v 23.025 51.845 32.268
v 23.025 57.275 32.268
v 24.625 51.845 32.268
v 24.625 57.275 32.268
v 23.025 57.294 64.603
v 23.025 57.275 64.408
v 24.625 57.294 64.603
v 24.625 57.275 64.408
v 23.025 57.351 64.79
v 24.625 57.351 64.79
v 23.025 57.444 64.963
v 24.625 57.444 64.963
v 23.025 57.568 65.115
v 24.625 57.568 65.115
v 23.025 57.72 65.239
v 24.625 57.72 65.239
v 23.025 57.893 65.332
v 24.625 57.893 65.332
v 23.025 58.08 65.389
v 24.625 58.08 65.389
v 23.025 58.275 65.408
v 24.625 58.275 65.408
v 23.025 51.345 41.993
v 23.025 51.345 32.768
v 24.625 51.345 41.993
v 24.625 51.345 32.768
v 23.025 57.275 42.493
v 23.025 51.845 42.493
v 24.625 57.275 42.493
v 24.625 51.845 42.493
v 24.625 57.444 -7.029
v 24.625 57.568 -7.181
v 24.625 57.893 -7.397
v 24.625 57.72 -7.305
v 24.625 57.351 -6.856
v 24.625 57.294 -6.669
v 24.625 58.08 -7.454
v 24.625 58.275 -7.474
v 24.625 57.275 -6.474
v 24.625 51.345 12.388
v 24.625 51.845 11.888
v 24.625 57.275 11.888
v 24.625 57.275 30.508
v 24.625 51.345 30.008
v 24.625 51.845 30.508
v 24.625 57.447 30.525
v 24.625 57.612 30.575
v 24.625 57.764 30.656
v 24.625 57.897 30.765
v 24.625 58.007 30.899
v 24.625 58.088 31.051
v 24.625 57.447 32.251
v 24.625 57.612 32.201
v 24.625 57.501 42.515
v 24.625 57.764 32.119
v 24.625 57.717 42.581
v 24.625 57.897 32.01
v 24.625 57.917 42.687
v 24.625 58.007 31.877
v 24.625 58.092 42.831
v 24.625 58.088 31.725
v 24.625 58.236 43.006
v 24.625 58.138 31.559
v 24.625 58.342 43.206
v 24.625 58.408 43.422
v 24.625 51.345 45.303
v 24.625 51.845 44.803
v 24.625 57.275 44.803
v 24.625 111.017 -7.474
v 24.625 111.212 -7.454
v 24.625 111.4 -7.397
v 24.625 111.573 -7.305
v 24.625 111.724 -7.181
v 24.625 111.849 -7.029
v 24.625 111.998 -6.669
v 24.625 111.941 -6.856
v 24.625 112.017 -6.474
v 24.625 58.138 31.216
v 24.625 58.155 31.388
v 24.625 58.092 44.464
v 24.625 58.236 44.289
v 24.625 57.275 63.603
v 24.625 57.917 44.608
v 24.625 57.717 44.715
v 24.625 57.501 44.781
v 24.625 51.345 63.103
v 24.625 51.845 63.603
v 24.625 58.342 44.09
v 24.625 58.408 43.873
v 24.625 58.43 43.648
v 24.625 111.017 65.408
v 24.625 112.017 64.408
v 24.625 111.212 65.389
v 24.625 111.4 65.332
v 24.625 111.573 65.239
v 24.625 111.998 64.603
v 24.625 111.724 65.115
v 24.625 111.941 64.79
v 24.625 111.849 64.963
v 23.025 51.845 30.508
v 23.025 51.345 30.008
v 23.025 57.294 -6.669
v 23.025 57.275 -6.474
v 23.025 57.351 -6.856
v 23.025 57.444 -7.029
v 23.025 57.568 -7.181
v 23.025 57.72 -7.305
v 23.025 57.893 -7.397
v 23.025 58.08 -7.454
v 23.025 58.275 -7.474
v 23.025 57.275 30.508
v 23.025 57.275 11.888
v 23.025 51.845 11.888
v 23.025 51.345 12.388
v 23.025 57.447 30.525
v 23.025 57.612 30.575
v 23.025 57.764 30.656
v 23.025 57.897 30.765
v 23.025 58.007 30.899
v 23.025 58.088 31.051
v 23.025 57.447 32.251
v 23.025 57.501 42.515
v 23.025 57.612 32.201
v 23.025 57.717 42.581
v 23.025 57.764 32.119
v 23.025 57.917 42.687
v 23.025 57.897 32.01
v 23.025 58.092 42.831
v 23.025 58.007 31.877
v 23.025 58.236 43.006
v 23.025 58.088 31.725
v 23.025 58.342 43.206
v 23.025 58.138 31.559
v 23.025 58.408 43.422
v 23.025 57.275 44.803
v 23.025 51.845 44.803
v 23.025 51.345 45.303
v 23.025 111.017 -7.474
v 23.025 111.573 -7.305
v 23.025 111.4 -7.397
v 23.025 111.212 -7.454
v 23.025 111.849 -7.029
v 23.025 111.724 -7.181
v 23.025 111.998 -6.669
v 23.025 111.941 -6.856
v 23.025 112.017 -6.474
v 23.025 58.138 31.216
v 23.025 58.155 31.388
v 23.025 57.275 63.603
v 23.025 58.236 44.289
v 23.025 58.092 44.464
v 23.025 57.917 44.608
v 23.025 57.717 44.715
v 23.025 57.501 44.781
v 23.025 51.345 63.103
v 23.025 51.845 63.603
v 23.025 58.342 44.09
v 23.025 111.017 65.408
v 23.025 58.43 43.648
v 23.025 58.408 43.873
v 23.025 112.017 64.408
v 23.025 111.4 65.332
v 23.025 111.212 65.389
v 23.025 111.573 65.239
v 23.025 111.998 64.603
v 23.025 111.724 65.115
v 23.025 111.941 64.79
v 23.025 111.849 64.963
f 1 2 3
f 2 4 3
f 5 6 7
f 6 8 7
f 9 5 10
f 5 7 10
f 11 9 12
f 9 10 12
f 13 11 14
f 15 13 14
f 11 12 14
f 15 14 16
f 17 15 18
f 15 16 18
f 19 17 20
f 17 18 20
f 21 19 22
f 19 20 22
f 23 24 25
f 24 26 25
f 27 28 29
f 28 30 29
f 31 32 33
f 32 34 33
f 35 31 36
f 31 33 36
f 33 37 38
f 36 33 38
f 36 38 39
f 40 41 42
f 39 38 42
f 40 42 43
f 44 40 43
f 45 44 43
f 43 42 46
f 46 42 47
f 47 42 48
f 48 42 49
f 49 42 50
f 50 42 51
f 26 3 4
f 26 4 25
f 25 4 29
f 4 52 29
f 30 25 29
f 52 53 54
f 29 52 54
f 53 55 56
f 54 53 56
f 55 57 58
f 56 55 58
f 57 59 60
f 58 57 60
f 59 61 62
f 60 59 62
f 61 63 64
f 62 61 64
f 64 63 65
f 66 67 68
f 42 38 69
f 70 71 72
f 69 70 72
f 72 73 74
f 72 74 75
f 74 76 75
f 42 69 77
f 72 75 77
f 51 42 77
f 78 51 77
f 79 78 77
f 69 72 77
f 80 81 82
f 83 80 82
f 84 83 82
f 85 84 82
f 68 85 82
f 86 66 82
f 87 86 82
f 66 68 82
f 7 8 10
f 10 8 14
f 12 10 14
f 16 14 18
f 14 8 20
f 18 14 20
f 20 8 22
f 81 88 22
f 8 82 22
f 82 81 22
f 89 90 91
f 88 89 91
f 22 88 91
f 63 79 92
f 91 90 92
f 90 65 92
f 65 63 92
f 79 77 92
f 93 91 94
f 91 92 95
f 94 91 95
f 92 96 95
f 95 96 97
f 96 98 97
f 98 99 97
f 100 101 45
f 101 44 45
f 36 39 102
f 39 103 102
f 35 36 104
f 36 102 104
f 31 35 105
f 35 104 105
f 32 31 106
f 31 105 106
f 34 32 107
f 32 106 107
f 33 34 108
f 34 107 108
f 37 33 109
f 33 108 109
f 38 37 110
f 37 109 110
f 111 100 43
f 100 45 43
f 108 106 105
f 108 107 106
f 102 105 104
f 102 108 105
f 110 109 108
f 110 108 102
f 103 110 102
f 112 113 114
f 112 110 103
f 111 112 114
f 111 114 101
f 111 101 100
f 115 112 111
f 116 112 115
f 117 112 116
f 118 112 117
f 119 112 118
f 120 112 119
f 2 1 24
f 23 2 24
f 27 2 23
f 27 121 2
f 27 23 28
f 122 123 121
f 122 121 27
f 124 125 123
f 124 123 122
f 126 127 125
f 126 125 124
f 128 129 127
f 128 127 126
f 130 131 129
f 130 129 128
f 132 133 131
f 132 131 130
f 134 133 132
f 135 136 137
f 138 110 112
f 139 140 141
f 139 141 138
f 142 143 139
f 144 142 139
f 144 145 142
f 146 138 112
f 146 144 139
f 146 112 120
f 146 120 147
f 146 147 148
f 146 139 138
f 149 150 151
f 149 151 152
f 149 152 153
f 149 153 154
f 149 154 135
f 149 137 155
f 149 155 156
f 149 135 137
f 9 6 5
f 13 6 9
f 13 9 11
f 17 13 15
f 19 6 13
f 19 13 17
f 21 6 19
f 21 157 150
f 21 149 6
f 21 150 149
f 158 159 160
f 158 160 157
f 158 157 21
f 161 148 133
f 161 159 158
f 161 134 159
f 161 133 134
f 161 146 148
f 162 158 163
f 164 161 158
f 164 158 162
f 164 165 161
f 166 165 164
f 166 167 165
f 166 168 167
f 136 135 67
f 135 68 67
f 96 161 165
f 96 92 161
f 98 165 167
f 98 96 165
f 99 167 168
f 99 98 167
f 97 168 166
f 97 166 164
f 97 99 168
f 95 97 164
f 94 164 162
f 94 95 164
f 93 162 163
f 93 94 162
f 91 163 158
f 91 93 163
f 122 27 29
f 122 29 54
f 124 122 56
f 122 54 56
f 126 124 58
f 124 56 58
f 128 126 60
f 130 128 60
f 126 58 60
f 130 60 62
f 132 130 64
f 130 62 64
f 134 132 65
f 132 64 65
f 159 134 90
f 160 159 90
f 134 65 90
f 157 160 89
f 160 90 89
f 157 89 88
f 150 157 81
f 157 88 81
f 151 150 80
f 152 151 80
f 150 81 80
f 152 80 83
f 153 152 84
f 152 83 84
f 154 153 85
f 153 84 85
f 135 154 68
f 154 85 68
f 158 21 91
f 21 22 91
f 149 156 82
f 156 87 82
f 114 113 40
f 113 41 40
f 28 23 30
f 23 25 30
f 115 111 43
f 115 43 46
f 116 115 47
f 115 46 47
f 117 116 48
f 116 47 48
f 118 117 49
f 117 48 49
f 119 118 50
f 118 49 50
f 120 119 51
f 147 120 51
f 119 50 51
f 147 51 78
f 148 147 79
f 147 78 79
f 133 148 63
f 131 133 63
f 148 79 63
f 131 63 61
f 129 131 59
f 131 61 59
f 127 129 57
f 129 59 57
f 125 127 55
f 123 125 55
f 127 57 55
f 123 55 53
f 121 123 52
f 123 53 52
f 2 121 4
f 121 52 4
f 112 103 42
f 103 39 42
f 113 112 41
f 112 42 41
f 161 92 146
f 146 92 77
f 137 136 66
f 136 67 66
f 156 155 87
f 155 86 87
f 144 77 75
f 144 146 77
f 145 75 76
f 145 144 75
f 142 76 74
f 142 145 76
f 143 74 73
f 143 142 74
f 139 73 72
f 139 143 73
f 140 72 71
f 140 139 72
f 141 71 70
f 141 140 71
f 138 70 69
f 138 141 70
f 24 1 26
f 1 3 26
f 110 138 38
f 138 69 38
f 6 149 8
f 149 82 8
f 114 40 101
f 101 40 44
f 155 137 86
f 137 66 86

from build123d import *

# Parameters (mm, degrees)
BOSS_EXTRUDE1_DEPTH      = 0.8
BOSS_EXTRUDE1_DEPTH_BACK = 0.8
FILLET1_R                = 1


with BuildPart() as part:
    # Sketch2 → Boss-Extrude1 (new, two sides: drawn at the far end of the back side and taken through both)
    with BuildSketch(Plane(origin=(23.824934682, 0, 0), x_dir=(0, 0, -1), z_dir=(1, 0, 0)).offset(-BOSS_EXTRUDE1_DEPTH_BACK)):
        with BuildLine():
            Line((-65.407740568, 112.017340514), (7.473597983, 112.017340514))
            Line((7.473597983, 112.017340514), (7.473597983, 57.27523093))
            Line((7.473597983, 57.27523093), (-11.887740568, 57.27523093))
            Line((-11.887740568, 57.27523093), (-11.887740568, 51.84523093))
            Line((-11.887740568, 51.84523093), (-12.387740568, 51.34523093))
            Line((-12.387740568, 51.34523093), (-30.007740568, 51.34523093))
            Line((-30.007740568, 51.34523093), (-30.507740568, 51.84523093))
            Line((-30.507740568, 51.84523093), (-30.507740568, 57.27523093))
            ThreePointArc((-30.507740568, 57.27523093), (-31.387740568, 58.15523093), (-32.267740568, 57.27523093))
            Line((-32.267740568, 57.27523093), (-32.267740568, 51.84523093))
            Line((-32.267740568, 51.84523093), (-32.767740568, 51.34523093))
            Line((-32.767740568, 51.34523093), (-41.992740568, 51.34523093))
            Line((-41.992740568, 51.34523093), (-42.492740568, 51.84523093))
            Line((-42.492740568, 51.84523093), (-42.492740568, 57.27523093))
            ThreePointArc((-42.492740568, 57.27523093), (-43.647740568, 58.43023093), (-44.802740568, 57.27523093))
            Line((-44.802740568, 57.27523093), (-44.802740568, 51.84523093))
            Line((-44.802740568, 51.84523093), (-45.302740568, 51.34523093))
            Line((-45.302740568, 51.34523093), (-63.102740568, 51.34523093))
            Line((-63.102740568, 51.34523093), (-63.602740568, 51.84523093))
            Line((-63.602740568, 51.84523093), (-63.602740568, 57.27523093))
            Line((-63.602740568, 57.27523093), (-65.407740568, 57.27523093))
            Line((-65.407740568, 57.27523093), (-65.407740568, 112.017340514))
        make_face()
    extrude(amount=BOSS_EXTRUDE1_DEPTH + BOSS_EXTRUDE1_DEPTH_BACK)

    # Fillet1
    fillet1_edges = [part.edges().sort_by_distance(p)[0] for p in [
        (23.824934682, 57.27523093, 65.407740568),
        (23.824934682, 57.27523093, -7.473597983),
        (23.824934682, 112.017340514, -7.473597983),
        (23.824934682, 112.017340514, 65.407740568),
    ]]
    fillet(fillet1_edges, radius=FILLET1_R)


solid = part.part
